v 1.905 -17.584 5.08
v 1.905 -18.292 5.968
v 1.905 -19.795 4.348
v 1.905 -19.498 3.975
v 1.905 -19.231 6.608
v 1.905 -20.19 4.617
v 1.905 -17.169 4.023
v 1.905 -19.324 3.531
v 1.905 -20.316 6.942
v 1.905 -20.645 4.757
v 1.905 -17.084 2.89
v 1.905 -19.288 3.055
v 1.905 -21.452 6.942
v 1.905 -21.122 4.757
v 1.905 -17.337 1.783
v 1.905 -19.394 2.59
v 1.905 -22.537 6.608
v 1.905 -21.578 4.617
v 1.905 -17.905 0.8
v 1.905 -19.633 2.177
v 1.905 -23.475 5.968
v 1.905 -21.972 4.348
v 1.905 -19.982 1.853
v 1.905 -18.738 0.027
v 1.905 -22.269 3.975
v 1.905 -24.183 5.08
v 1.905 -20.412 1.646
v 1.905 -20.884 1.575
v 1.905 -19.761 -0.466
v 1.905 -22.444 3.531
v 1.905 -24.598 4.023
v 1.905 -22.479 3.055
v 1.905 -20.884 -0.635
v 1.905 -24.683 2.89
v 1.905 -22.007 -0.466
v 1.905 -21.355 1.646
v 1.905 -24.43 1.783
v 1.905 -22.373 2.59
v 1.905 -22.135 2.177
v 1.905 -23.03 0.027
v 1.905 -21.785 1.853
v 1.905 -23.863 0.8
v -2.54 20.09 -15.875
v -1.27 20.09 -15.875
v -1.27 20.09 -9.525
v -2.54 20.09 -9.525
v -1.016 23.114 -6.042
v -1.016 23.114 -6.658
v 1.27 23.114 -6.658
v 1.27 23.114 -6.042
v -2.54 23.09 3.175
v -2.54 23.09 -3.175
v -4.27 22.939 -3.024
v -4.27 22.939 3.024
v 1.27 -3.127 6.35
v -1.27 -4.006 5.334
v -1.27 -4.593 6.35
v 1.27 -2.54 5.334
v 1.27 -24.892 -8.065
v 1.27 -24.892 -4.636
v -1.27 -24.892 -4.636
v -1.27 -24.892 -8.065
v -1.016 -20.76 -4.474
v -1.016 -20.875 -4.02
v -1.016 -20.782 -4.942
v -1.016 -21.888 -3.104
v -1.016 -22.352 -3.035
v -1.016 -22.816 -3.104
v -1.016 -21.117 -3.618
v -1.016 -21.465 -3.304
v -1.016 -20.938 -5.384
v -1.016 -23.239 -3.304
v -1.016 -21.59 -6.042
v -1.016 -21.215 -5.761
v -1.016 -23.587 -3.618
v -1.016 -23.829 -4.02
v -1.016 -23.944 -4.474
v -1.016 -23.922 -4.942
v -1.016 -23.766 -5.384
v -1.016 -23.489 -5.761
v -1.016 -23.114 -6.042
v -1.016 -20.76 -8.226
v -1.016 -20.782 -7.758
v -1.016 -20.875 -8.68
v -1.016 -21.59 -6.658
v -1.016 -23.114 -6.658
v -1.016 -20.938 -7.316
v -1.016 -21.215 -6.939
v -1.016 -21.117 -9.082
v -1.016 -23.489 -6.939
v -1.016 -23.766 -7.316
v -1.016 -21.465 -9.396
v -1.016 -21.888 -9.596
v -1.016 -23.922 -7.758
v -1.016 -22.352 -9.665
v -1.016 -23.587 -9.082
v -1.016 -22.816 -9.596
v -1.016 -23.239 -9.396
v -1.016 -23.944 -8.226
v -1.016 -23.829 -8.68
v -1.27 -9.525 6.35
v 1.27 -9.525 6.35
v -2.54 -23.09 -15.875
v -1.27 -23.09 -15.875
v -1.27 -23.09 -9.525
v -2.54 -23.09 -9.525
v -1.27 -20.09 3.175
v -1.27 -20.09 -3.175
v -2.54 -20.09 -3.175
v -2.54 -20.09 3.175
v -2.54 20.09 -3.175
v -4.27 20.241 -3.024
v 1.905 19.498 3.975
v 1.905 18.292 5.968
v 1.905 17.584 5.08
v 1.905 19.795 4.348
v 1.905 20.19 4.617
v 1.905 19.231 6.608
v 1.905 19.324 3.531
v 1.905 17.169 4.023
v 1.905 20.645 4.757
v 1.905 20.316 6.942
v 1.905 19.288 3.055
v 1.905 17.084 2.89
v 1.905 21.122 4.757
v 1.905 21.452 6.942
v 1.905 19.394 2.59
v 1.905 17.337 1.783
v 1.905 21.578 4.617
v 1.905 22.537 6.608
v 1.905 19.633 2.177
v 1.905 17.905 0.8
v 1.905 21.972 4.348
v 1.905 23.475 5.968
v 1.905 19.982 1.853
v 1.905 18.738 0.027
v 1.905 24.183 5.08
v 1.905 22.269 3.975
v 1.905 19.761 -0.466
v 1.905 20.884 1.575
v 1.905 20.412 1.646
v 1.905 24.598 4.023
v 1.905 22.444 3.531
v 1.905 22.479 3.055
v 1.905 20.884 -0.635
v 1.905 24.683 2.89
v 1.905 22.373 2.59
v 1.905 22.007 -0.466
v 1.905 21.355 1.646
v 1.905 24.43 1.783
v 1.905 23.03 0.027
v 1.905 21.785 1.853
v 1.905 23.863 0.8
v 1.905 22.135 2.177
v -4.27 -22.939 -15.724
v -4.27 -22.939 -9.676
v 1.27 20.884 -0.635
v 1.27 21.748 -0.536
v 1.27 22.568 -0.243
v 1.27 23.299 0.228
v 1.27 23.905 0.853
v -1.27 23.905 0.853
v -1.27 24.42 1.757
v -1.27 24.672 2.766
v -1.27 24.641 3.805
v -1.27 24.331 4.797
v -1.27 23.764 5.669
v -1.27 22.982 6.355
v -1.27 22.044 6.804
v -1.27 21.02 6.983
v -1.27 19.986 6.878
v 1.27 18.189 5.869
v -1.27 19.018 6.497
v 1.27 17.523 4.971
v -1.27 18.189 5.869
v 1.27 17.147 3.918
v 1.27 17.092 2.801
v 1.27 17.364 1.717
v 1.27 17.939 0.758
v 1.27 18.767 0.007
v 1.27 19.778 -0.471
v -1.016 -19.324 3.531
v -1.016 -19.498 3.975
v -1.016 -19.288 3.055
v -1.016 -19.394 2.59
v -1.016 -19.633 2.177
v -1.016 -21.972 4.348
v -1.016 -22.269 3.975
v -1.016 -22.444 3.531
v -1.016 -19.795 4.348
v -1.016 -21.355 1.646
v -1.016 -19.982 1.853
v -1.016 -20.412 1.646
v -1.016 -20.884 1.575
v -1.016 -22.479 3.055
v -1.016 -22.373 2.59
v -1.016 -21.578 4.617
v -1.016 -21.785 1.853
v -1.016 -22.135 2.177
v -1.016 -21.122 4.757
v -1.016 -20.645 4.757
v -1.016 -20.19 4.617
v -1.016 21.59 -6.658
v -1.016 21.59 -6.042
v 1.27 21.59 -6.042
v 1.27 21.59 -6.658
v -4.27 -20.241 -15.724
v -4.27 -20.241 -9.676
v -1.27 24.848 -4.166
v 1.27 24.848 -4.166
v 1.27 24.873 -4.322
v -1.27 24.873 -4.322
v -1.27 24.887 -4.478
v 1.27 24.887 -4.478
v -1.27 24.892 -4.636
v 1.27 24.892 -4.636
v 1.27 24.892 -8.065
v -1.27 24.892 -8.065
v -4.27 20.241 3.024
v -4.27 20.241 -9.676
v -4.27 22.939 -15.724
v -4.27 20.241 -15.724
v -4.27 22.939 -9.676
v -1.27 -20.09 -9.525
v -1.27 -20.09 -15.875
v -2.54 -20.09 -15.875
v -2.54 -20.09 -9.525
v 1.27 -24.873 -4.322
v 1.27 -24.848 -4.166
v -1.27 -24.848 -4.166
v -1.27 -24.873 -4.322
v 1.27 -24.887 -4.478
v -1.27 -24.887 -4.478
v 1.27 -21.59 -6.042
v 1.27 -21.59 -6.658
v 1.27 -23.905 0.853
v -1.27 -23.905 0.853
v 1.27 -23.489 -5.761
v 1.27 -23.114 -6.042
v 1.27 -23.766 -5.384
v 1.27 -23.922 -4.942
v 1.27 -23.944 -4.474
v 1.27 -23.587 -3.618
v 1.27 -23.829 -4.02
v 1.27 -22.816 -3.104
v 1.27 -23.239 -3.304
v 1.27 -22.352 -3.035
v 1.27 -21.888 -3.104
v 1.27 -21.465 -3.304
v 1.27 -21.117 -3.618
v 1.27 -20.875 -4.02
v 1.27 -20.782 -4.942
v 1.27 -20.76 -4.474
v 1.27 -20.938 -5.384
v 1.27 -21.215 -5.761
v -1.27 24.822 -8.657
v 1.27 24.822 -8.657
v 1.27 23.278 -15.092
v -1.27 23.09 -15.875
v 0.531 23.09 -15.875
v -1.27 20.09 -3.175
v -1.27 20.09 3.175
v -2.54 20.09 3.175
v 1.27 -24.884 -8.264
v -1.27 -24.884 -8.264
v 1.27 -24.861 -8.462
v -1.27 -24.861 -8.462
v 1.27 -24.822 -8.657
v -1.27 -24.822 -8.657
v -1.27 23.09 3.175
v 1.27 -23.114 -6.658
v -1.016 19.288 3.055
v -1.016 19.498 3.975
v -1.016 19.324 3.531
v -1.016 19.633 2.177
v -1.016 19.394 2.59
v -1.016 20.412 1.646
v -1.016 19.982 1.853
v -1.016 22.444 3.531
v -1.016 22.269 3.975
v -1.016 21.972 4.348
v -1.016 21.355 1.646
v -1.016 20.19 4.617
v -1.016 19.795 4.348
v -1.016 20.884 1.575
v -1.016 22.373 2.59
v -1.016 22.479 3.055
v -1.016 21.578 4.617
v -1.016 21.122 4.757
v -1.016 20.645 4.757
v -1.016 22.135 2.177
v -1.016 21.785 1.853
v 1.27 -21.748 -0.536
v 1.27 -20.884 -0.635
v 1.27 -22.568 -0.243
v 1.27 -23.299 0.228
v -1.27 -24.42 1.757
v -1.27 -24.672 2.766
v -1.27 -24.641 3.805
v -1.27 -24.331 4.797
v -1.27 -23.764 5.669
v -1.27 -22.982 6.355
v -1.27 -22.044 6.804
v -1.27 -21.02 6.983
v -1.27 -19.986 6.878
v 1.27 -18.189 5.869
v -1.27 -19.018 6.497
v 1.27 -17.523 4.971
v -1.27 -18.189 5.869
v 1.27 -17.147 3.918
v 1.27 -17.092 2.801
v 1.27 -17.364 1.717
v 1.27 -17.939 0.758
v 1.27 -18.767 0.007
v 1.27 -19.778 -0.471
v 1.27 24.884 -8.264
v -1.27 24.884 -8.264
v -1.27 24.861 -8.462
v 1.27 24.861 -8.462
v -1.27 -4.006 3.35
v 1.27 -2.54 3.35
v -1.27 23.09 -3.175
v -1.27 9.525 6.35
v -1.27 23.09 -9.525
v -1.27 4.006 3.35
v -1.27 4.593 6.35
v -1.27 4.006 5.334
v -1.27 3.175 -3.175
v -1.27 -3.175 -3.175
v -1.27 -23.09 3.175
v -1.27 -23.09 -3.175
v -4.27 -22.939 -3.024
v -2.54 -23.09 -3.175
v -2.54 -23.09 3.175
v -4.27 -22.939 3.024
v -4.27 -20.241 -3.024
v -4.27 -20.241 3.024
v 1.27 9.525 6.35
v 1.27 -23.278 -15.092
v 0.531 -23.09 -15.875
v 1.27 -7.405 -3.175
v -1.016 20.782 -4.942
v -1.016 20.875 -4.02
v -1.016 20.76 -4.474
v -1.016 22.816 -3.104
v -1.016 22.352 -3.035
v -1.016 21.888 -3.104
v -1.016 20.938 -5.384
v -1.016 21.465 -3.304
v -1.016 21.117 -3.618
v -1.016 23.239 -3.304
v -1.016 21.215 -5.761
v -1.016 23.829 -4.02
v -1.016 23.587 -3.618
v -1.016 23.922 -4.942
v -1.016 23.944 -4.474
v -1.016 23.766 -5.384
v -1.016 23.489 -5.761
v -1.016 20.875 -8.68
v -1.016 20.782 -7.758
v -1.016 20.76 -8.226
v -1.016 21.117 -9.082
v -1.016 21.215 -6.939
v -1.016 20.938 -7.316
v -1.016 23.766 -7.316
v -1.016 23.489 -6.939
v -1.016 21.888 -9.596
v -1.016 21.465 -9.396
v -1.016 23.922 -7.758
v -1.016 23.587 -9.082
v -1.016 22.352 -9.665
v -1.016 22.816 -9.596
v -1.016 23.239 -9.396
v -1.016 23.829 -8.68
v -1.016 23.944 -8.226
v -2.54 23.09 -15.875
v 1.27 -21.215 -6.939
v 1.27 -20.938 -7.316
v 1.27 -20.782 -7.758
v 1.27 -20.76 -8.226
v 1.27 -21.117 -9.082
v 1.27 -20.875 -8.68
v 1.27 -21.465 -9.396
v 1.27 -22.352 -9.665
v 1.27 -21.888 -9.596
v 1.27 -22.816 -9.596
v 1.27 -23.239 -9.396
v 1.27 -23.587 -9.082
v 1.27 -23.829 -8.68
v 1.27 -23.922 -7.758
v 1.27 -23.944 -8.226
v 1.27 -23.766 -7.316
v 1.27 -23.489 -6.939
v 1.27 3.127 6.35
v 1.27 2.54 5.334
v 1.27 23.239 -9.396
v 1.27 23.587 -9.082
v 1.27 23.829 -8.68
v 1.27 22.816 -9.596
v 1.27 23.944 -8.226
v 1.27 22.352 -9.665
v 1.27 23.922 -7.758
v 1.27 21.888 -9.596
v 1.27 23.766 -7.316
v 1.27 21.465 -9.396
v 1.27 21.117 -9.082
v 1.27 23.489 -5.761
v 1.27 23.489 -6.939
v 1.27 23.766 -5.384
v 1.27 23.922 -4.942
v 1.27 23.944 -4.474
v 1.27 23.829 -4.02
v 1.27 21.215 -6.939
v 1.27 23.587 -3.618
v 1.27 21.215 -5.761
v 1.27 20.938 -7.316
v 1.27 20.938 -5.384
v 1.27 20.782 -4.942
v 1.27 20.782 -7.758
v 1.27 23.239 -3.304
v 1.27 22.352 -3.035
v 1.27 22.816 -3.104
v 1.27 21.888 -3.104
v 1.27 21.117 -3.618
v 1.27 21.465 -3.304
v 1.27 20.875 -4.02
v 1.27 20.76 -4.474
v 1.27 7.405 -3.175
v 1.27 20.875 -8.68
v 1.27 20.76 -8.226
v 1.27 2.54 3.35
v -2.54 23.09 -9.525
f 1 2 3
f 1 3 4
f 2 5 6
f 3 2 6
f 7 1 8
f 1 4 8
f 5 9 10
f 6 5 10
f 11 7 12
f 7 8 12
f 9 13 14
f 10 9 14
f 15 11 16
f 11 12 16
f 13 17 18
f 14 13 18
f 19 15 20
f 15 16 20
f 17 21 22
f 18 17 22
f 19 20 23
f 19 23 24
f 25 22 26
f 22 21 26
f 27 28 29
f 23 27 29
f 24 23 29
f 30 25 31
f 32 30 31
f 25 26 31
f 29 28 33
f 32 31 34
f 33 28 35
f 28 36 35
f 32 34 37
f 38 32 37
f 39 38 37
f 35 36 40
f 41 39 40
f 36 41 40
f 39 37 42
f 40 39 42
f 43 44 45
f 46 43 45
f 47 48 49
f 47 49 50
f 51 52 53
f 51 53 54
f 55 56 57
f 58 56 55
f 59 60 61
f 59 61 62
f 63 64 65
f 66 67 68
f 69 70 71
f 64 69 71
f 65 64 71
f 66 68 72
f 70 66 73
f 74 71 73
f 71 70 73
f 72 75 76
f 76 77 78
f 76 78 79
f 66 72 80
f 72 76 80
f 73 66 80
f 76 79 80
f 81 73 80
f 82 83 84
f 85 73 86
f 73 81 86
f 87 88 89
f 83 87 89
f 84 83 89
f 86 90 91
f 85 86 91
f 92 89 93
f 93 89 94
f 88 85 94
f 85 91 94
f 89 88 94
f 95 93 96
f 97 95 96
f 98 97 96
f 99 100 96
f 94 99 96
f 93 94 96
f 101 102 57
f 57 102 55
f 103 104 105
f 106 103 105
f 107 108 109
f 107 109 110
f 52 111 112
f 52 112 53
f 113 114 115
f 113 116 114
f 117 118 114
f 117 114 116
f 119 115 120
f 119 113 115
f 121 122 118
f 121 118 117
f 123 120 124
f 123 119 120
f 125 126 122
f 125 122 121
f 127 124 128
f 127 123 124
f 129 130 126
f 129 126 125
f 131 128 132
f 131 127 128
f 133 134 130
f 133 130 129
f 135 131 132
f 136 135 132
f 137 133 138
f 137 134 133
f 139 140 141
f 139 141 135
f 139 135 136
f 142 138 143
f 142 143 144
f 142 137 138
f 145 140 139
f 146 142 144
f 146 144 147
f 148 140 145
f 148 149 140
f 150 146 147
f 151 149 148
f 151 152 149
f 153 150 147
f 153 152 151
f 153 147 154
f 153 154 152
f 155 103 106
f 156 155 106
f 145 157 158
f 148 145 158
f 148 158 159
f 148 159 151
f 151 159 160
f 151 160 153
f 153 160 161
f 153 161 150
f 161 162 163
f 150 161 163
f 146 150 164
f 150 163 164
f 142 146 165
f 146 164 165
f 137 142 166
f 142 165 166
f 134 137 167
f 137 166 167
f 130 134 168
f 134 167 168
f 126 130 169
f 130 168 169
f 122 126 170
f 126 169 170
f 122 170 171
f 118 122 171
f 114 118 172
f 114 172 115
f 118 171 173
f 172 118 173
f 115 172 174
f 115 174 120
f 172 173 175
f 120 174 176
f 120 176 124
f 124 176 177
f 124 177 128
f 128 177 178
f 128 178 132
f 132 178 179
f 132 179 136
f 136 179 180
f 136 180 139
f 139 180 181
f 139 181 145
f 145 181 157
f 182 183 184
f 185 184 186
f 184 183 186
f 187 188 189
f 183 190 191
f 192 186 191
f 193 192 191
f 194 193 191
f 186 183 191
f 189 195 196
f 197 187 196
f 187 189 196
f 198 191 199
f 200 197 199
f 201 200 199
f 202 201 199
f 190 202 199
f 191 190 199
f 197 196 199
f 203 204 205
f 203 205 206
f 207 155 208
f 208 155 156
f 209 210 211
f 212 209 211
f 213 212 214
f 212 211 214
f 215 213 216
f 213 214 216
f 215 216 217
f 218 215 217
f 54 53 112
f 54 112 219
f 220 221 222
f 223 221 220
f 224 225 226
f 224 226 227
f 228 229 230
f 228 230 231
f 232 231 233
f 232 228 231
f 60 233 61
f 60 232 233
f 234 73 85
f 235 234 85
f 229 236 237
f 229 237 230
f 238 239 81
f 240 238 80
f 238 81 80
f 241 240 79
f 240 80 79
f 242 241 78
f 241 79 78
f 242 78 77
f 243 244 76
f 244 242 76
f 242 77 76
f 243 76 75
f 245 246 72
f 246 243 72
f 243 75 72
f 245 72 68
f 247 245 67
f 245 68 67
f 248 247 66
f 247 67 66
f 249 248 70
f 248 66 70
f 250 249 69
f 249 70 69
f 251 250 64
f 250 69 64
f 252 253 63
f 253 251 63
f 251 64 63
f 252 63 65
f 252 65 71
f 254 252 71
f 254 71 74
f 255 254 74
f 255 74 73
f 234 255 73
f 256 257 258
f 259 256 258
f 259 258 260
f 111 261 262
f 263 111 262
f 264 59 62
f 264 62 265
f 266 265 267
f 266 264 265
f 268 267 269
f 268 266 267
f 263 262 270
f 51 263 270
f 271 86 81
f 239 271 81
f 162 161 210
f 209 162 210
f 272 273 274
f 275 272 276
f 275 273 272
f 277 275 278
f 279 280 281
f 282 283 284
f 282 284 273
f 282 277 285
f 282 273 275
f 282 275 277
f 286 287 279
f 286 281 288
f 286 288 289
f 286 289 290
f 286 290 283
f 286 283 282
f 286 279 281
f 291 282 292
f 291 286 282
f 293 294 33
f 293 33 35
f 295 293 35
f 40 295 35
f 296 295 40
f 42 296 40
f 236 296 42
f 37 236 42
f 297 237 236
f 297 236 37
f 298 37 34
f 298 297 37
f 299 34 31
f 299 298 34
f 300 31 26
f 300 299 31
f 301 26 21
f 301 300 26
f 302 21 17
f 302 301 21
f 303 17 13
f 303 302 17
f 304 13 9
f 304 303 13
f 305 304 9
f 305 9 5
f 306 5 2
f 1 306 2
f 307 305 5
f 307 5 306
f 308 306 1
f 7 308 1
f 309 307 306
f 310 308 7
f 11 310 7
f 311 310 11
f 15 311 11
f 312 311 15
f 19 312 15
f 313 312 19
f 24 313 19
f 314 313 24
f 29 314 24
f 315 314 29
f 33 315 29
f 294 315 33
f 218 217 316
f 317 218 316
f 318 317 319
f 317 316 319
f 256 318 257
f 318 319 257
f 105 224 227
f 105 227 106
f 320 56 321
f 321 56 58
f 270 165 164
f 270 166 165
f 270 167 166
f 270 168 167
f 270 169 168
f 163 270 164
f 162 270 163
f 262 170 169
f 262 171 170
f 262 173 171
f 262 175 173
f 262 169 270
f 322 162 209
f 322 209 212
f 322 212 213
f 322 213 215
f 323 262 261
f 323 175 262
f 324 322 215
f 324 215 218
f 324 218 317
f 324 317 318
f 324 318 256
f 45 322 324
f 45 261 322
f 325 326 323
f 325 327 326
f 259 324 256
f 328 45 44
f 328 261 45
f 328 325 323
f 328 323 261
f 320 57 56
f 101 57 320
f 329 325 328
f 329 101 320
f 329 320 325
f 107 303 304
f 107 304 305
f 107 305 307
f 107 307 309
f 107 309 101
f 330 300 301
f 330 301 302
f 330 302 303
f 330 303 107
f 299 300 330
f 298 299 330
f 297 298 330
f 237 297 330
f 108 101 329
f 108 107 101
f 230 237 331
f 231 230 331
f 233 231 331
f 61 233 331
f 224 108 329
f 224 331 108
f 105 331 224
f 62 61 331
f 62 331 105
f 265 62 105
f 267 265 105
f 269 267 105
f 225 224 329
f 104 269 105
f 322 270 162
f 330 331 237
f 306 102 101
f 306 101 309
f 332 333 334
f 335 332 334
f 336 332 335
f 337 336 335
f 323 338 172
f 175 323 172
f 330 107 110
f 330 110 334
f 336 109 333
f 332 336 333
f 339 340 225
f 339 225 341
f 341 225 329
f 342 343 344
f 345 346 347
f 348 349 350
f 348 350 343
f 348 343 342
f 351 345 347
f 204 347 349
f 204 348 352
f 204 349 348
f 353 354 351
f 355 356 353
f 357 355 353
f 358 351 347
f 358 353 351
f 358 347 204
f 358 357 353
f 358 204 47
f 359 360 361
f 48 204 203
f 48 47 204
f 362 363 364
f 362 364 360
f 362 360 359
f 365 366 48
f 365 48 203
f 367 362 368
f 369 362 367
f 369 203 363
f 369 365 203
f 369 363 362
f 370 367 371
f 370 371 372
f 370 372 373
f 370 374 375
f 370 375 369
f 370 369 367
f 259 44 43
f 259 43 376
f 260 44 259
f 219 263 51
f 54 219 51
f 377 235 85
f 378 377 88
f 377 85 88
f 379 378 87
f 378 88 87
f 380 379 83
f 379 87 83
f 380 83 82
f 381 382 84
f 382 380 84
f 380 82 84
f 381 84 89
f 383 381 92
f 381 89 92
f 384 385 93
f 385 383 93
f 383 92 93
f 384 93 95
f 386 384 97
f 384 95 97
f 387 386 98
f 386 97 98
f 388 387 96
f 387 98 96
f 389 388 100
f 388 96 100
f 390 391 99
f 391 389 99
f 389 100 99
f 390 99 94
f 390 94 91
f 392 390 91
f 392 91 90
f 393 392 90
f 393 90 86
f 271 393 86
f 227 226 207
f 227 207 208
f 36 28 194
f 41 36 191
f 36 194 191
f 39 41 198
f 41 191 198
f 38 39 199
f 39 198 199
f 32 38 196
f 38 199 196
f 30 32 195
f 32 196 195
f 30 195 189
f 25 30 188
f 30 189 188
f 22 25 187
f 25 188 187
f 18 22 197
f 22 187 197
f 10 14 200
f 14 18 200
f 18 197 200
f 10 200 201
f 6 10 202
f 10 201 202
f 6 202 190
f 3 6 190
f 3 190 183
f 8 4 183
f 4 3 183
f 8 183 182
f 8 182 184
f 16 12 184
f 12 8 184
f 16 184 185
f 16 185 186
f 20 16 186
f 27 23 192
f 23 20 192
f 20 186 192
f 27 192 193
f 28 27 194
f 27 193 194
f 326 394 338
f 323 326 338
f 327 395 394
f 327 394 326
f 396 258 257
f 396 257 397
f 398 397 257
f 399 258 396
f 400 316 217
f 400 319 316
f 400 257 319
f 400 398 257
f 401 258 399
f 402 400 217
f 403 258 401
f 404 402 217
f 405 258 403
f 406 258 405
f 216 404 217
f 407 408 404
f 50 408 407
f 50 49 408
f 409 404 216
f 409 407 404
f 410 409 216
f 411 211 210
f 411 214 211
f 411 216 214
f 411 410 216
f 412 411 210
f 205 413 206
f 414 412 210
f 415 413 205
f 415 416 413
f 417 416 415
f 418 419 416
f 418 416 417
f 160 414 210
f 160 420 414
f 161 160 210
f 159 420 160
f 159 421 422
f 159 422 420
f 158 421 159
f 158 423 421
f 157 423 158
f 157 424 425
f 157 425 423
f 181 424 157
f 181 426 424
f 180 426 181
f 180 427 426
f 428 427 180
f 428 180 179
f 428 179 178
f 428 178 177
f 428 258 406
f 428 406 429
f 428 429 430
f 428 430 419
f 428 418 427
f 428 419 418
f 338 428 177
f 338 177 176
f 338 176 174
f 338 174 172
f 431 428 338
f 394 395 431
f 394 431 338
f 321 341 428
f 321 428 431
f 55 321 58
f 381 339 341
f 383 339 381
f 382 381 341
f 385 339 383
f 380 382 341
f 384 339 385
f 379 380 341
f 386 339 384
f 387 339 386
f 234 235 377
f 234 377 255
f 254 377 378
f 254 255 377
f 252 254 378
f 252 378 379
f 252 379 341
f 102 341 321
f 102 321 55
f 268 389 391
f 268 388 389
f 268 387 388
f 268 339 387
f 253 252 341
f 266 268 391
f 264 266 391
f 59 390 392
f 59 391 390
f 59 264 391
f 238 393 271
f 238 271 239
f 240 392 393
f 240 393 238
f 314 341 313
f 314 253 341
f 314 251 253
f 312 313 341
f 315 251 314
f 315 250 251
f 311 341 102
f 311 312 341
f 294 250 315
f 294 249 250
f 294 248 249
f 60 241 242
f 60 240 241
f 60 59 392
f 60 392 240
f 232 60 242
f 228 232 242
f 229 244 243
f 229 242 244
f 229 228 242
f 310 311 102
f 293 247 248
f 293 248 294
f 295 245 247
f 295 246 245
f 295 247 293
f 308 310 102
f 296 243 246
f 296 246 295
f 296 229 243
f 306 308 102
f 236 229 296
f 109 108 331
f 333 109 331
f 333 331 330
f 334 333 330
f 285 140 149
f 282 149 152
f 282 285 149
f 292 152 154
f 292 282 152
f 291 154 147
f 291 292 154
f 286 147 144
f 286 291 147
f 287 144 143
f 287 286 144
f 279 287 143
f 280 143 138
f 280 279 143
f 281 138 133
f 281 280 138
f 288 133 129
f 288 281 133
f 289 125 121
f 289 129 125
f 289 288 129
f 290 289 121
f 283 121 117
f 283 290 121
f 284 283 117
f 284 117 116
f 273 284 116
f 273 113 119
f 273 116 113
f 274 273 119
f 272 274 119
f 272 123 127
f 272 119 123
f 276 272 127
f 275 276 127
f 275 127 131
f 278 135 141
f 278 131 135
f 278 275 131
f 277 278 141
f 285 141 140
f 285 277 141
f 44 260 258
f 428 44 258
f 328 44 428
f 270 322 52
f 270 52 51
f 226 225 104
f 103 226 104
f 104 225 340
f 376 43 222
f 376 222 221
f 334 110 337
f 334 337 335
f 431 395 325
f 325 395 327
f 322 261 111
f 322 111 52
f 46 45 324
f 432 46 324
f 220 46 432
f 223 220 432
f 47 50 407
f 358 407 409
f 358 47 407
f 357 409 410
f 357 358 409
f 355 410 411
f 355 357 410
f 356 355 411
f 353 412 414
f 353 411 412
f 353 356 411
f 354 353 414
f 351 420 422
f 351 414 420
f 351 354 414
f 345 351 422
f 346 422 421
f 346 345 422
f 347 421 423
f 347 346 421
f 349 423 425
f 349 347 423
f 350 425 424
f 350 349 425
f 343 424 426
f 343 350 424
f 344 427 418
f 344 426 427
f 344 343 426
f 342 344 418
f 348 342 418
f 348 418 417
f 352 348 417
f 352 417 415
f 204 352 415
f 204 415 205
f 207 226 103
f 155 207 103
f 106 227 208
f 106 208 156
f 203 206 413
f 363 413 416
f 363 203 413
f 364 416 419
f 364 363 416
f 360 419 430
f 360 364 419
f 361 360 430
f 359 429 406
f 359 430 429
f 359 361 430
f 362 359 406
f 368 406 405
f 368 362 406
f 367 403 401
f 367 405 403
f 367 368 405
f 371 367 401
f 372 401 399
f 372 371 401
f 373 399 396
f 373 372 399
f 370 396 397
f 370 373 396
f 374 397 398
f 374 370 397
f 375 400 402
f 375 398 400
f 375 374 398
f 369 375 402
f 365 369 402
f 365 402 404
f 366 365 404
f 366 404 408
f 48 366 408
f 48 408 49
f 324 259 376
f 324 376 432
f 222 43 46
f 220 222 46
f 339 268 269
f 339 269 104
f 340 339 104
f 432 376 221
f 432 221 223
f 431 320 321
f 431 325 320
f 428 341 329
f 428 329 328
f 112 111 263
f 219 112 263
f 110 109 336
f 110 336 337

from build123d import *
from OCP.BRepFilletAPI import BRepFilletAPI_MakeChamfer

# Parameters (mm, degrees)
DOWELSUPPORT_DEPTH       = 1.905
DOWELSUPPORT_DEPTH_BACK  = 1.27
SKETCH3_R                = 3.81
SKETCH5_W                = 9.525
SKETCH5_H                = 19.05
SLIDERDOWELSUPPORT_DEPTH = 1.27
STRINGDOWELSUPPORT_DEPTH = 1.27
SKETCH9_W                = 6.35
SKETCH9_H                = 3
TABSUPPORT_DEPTH         = 1.27
INTERSUPPORT_DEPTH       = 1.27
DOWELHOLES_DEPTH         = 30.584731096
DOWELHOLES_DEPTH_BACK    = 30.584731096
SKETCH11_R               = 1.600000102
BOSS_EXTRUDE1_START      = -1.27
SKETCH11_2_R             = 1.600000102
BOSS_EXTRUDE1_DEPTH      = 0.254
SKETCH14_W               = 6.35
SKETCH14_H               = 3
TABBASE_DEPTH            = 1.27
SKETCH15_W               = 6.35
SKETCH15_H               = 3
TABDRAFT_DEPTH           = 1.73
TABDRAFT_DRAFT           = 5
TABDRAFT_PROFILE_2_DEPTH = 1.73
TABDRAFT_PROFILE_2_DRAFT = 5
CHAMFER1_SIZE            = 2.54
CUT_EXTRUDE1_DEPTH       = 3
CHAMFER2_SIZE            = 0.508
CHAMFER2_SIZE2           = 1.016


with BuildPart() as part:
    # Sketch3 → DowelSupport (new, two sides: drawn at the far end of the back side and taken through both)
    with BuildSketch(Plane(origin=(0, 0, 0), x_dir=(0, 0, -1), z_dir=(1, 0, 0)).offset(-DOWELSUPPORT_DEPTH_BACK)):
        with Locations((-3.175, 20.88375)):
            Circle(SKETCH3_R)
    extrude(amount=DOWELSUPPORT_DEPTH + DOWELSUPPORT_DEPTH_BACK)



with BuildPart() as body_2:
    # Sketch5 → SliderDowelSupport (new, symmetric)
    with BuildSketch(Plane(origin=(0, 0, 0), x_dir=(0, 0, -1), z_dir=(1, 0, 0))):
        with Locations((-1.5875, 0)):
            Rectangle(SKETCH5_W, SKETCH5_H)
    extrude(amount=SLIDERDOWELSUPPORT_DEPTH, both=True)


with BuildPart() as body_3:
    # Sketch8 → StringDowelSupport (new, symmetric)
    with BuildSketch(Plane(origin=(0, 0, 0), x_dir=(0, 0, -1), z_dir=(1, 0, 0))):
        with BuildLine():
            Line((4.6355, 24.892), (8.0645, 24.892))
            ThreePointArc((8.0645, 24.892), (10.6045, 22.352), (8.0645, 19.812))
            Line((8.0645, 19.812), (4.6355, 19.812))
            ThreePointArc((4.6355, 19.812), (2.0955, 22.352), (4.6355, 24.892))
        make_face()
    extrude(amount=STRINGDOWELSUPPORT_DEPTH, both=True)


with BuildPart() as part_1:
    add(part.part)

    add(body_3.part)  # TabSupport merges body 3
    # Sketch9 → TabSupport (add, symmetric)
    with BuildSketch(Plane(origin=(0, 0, 0), x_dir=(0, 0, -1), z_dir=(1, 0, 0))):
        with Locations((0, 21.59)):
            Rectangle(SKETCH9_W, SKETCH9_H)
        with Locations((12.7, 21.59)):
            Rectangle(SKETCH9_W, SKETCH9_H)
    extrude(amount=TABSUPPORT_DEPTH, both=True)


    add(body_2.part)  # InterSupport merges body 2
    # Sketch10 → InterSupport (add, symmetric)
    with BuildSketch(Plane(origin=(0, 0, 0), x_dir=(0, 0, -1), z_dir=(1, 0, 0))):
        Polygon((-6.35, 9.525), (-5.711088789, 21.024652996), (-3.644260291, 23.380026182), (4.166239709, 24.848276182), (8.657140431, 24.821894192), (15.875, 23.09), (15.875, 20.09), (3.175, 3.175), (3.175, 9.525), align=None)
    extrude(amount=INTERSUPPORT_DEPTH, both=True)

    # Sketch11 → DowelHoles (cut, two sides: drawn at the far end of the back side and taken through both)
    with BuildSketch(Plane(origin=(0, 0, 0), x_dir=(0, 0, -1), z_dir=(1, 0, 0)).offset(-DOWELHOLES_DEPTH_BACK)):
        with Locations((-3.175, 20.88375)):
            Circle(SKETCH11_R)
        with BuildLine():
            Line((6.04239599, 21.59), (6.65760401, 21.59))
            ThreePointArc((6.65760401, 21.59), (9.664500102, 22.352), (6.65760401, 23.114))
            Line((6.65760401, 23.114), (6.04239599, 23.114))
            ThreePointArc((6.04239599, 23.114), (3.035499898, 22.352), (6.04239599, 21.59))
        make_face()
    extrude(amount=DOWELHOLES_DEPTH + DOWELHOLES_DEPTH_BACK, mode=Mode.SUBTRACT)

    # Sketch11<2> → Boss-Extrude1 (add)
    with BuildSketch(Plane(origin=(0, 0, 0), x_dir=(0, 0, -1), z_dir=(1, 0, 0)).offset(BOSS_EXTRUDE1_START)):
        with BuildLine():
            Line((6.04239599, 21.59), (6.65760401, 21.59))
            ThreePointArc((6.65760401, 21.59), (9.664500102, 22.352), (6.65760401, 23.114))
            Line((6.65760401, 23.114), (6.04239599, 23.114))
            ThreePointArc((6.04239599, 23.114), (3.035499898, 22.352), (6.04239599, 21.59))
        make_face()
        with Locations((-3.175, 20.88375)):
            Circle(SKETCH11_2_R)
    extrude(amount=BOSS_EXTRUDE1_DEPTH)

    # Sketch14 → TabBase (add)
    with BuildSketch(Plane.ZY.offset(1.27)):
        with Locations((-12.7, 21.59)):
            Rectangle(SKETCH14_W, SKETCH14_H)
        with Locations((0, 21.59)):
            Rectangle(SKETCH14_W, SKETCH14_H)
    extrude(amount=TABBASE_DEPTH)


with BuildPart() as tabdraft_tool:
    # Sketch15 → TabDraft (with draft: the straight prism first)
    with BuildSketch(Plane.ZY.offset(2.54)):
        with Locations((0, 21.59)):
            Rectangle(SKETCH15_W, SKETCH15_H)
    extrude(amount=TABDRAFT_DEPTH)
    # TabDraft: the draft: its side faces are tilted about the plane it starts from
    tabdraft_sides = [tabdraft_tool.faces().sort_by_distance(p)[0] for p in [
        (-3.405, 21.59, -3.175),
        (-3.405, 20.09, 0),
        (-3.405, 21.59, 3.175),
        (-3.405, 23.09, 0),
    ]]
    draft(tabdraft_sides, Plane.ZY.offset(2.54), TABDRAFT_DRAFT)


with BuildPart() as part_2:
    add(part_1.part)

    # TabDraft: add tabdraft_tool
    add(tabdraft_tool.part)


with BuildPart() as tabdraft_profile_2_tool:
    # Sketch15 → TabDraft profile 2 (with draft: the straight prism first)
    with BuildSketch(Plane.ZY.offset(2.54)):
        with Locations((-12.7, 21.59)):
            Rectangle(SKETCH15_W, SKETCH15_H)
    extrude(amount=TABDRAFT_PROFILE_2_DEPTH)
    # TabDraft profile 2: the draft: its side faces are tilted about the plane it starts from
    tabdraft_profile_2_sides = [tabdraft_profile_2_tool.faces().sort_by_distance(p)[0] for p in [
        (-3.405, 21.59, -15.875),
        (-3.405, 20.09, -12.7),
        (-3.405, 21.59, -9.525),
        (-3.405, 23.09, -12.7),
    ]]
    draft(tabdraft_profile_2_sides, Plane.ZY.offset(2.54), TABDRAFT_PROFILE_2_DRAFT)


with BuildPart() as part_3:
    add(part_2.part)

    # TabDraft profile 2: add tabdraft_profile_2_tool
    add(tabdraft_profile_2_tool.part)

    # Chamfer1
    chamfer1_edges = [part_3.edges().sort_by_distance(p)[0] for p in [
        (1.27, 11.6325, -9.525),
    ]]
    chamfer(chamfer1_edges, length=CHAMFER1_SIZE - 0.0001)  # a hair under: the kernel refuses the full size

    # Mirror1: part across plane


with BuildPart() as part_4:
    add(part_3.part)
    add(part_3.part.mirror(Plane.ZX))

    # Sketch16 → Cut-Extrude1 (cut)
    with BuildSketch(Plane.XY.offset(6.35)):
        Polygon((-1.27, -4.006469684), (1.27, -2.54), (1.27, 2.54), (-1.27, 4.006469684), align=None)
    extrude(amount=-CUT_EXTRUDE1_DEPTH, mode=Mode.SUBTRACT)

    # Chamfer2: one chamfer whose edges measure the first distance from different faces: ONE call of the kernel's chamfer builder (chamfer() names one face for all edges)
    chamfer2_edges_1 = [part_4.edges().sort_by_distance(p)[0] for p in [
        (0, -3.273234842, 6.35),
    ]]
    chamfer2_side_1 = [part_4.faces().sort_by_distance(p)[0] for p in [
        (0.049650417, -6.38478458, 6.35),
    ]]
    chamfer2_edges_2 = [part_4.edges().sort_by_distance(p)[0] for p in [
        (0, 3.273234842, 6.35),
    ]]
    chamfer2_side_2 = [part_4.faces().sort_by_distance(p)[0] for p in [
        (0.049650417, 6.38478458, 6.35),
    ]]
    chamfer2 = BRepFilletAPI_MakeChamfer(part_4.part.solid().wrapped)
    for e in chamfer2_edges_1:
        chamfer2.Add(CHAMFER2_SIZE, CHAMFER2_SIZE2, e.wrapped, chamfer2_side_1[0].wrapped)  # the first distance lies on this face
    for e in chamfer2_edges_2:
        chamfer2.Add(CHAMFER2_SIZE, CHAMFER2_SIZE2, e.wrapped, chamfer2_side_2[0].wrapped)  # the first distance lies on this face
    add(Compound.cast(chamfer2.Shape()), mode=Mode.REPLACE)


solid = part_4.part
